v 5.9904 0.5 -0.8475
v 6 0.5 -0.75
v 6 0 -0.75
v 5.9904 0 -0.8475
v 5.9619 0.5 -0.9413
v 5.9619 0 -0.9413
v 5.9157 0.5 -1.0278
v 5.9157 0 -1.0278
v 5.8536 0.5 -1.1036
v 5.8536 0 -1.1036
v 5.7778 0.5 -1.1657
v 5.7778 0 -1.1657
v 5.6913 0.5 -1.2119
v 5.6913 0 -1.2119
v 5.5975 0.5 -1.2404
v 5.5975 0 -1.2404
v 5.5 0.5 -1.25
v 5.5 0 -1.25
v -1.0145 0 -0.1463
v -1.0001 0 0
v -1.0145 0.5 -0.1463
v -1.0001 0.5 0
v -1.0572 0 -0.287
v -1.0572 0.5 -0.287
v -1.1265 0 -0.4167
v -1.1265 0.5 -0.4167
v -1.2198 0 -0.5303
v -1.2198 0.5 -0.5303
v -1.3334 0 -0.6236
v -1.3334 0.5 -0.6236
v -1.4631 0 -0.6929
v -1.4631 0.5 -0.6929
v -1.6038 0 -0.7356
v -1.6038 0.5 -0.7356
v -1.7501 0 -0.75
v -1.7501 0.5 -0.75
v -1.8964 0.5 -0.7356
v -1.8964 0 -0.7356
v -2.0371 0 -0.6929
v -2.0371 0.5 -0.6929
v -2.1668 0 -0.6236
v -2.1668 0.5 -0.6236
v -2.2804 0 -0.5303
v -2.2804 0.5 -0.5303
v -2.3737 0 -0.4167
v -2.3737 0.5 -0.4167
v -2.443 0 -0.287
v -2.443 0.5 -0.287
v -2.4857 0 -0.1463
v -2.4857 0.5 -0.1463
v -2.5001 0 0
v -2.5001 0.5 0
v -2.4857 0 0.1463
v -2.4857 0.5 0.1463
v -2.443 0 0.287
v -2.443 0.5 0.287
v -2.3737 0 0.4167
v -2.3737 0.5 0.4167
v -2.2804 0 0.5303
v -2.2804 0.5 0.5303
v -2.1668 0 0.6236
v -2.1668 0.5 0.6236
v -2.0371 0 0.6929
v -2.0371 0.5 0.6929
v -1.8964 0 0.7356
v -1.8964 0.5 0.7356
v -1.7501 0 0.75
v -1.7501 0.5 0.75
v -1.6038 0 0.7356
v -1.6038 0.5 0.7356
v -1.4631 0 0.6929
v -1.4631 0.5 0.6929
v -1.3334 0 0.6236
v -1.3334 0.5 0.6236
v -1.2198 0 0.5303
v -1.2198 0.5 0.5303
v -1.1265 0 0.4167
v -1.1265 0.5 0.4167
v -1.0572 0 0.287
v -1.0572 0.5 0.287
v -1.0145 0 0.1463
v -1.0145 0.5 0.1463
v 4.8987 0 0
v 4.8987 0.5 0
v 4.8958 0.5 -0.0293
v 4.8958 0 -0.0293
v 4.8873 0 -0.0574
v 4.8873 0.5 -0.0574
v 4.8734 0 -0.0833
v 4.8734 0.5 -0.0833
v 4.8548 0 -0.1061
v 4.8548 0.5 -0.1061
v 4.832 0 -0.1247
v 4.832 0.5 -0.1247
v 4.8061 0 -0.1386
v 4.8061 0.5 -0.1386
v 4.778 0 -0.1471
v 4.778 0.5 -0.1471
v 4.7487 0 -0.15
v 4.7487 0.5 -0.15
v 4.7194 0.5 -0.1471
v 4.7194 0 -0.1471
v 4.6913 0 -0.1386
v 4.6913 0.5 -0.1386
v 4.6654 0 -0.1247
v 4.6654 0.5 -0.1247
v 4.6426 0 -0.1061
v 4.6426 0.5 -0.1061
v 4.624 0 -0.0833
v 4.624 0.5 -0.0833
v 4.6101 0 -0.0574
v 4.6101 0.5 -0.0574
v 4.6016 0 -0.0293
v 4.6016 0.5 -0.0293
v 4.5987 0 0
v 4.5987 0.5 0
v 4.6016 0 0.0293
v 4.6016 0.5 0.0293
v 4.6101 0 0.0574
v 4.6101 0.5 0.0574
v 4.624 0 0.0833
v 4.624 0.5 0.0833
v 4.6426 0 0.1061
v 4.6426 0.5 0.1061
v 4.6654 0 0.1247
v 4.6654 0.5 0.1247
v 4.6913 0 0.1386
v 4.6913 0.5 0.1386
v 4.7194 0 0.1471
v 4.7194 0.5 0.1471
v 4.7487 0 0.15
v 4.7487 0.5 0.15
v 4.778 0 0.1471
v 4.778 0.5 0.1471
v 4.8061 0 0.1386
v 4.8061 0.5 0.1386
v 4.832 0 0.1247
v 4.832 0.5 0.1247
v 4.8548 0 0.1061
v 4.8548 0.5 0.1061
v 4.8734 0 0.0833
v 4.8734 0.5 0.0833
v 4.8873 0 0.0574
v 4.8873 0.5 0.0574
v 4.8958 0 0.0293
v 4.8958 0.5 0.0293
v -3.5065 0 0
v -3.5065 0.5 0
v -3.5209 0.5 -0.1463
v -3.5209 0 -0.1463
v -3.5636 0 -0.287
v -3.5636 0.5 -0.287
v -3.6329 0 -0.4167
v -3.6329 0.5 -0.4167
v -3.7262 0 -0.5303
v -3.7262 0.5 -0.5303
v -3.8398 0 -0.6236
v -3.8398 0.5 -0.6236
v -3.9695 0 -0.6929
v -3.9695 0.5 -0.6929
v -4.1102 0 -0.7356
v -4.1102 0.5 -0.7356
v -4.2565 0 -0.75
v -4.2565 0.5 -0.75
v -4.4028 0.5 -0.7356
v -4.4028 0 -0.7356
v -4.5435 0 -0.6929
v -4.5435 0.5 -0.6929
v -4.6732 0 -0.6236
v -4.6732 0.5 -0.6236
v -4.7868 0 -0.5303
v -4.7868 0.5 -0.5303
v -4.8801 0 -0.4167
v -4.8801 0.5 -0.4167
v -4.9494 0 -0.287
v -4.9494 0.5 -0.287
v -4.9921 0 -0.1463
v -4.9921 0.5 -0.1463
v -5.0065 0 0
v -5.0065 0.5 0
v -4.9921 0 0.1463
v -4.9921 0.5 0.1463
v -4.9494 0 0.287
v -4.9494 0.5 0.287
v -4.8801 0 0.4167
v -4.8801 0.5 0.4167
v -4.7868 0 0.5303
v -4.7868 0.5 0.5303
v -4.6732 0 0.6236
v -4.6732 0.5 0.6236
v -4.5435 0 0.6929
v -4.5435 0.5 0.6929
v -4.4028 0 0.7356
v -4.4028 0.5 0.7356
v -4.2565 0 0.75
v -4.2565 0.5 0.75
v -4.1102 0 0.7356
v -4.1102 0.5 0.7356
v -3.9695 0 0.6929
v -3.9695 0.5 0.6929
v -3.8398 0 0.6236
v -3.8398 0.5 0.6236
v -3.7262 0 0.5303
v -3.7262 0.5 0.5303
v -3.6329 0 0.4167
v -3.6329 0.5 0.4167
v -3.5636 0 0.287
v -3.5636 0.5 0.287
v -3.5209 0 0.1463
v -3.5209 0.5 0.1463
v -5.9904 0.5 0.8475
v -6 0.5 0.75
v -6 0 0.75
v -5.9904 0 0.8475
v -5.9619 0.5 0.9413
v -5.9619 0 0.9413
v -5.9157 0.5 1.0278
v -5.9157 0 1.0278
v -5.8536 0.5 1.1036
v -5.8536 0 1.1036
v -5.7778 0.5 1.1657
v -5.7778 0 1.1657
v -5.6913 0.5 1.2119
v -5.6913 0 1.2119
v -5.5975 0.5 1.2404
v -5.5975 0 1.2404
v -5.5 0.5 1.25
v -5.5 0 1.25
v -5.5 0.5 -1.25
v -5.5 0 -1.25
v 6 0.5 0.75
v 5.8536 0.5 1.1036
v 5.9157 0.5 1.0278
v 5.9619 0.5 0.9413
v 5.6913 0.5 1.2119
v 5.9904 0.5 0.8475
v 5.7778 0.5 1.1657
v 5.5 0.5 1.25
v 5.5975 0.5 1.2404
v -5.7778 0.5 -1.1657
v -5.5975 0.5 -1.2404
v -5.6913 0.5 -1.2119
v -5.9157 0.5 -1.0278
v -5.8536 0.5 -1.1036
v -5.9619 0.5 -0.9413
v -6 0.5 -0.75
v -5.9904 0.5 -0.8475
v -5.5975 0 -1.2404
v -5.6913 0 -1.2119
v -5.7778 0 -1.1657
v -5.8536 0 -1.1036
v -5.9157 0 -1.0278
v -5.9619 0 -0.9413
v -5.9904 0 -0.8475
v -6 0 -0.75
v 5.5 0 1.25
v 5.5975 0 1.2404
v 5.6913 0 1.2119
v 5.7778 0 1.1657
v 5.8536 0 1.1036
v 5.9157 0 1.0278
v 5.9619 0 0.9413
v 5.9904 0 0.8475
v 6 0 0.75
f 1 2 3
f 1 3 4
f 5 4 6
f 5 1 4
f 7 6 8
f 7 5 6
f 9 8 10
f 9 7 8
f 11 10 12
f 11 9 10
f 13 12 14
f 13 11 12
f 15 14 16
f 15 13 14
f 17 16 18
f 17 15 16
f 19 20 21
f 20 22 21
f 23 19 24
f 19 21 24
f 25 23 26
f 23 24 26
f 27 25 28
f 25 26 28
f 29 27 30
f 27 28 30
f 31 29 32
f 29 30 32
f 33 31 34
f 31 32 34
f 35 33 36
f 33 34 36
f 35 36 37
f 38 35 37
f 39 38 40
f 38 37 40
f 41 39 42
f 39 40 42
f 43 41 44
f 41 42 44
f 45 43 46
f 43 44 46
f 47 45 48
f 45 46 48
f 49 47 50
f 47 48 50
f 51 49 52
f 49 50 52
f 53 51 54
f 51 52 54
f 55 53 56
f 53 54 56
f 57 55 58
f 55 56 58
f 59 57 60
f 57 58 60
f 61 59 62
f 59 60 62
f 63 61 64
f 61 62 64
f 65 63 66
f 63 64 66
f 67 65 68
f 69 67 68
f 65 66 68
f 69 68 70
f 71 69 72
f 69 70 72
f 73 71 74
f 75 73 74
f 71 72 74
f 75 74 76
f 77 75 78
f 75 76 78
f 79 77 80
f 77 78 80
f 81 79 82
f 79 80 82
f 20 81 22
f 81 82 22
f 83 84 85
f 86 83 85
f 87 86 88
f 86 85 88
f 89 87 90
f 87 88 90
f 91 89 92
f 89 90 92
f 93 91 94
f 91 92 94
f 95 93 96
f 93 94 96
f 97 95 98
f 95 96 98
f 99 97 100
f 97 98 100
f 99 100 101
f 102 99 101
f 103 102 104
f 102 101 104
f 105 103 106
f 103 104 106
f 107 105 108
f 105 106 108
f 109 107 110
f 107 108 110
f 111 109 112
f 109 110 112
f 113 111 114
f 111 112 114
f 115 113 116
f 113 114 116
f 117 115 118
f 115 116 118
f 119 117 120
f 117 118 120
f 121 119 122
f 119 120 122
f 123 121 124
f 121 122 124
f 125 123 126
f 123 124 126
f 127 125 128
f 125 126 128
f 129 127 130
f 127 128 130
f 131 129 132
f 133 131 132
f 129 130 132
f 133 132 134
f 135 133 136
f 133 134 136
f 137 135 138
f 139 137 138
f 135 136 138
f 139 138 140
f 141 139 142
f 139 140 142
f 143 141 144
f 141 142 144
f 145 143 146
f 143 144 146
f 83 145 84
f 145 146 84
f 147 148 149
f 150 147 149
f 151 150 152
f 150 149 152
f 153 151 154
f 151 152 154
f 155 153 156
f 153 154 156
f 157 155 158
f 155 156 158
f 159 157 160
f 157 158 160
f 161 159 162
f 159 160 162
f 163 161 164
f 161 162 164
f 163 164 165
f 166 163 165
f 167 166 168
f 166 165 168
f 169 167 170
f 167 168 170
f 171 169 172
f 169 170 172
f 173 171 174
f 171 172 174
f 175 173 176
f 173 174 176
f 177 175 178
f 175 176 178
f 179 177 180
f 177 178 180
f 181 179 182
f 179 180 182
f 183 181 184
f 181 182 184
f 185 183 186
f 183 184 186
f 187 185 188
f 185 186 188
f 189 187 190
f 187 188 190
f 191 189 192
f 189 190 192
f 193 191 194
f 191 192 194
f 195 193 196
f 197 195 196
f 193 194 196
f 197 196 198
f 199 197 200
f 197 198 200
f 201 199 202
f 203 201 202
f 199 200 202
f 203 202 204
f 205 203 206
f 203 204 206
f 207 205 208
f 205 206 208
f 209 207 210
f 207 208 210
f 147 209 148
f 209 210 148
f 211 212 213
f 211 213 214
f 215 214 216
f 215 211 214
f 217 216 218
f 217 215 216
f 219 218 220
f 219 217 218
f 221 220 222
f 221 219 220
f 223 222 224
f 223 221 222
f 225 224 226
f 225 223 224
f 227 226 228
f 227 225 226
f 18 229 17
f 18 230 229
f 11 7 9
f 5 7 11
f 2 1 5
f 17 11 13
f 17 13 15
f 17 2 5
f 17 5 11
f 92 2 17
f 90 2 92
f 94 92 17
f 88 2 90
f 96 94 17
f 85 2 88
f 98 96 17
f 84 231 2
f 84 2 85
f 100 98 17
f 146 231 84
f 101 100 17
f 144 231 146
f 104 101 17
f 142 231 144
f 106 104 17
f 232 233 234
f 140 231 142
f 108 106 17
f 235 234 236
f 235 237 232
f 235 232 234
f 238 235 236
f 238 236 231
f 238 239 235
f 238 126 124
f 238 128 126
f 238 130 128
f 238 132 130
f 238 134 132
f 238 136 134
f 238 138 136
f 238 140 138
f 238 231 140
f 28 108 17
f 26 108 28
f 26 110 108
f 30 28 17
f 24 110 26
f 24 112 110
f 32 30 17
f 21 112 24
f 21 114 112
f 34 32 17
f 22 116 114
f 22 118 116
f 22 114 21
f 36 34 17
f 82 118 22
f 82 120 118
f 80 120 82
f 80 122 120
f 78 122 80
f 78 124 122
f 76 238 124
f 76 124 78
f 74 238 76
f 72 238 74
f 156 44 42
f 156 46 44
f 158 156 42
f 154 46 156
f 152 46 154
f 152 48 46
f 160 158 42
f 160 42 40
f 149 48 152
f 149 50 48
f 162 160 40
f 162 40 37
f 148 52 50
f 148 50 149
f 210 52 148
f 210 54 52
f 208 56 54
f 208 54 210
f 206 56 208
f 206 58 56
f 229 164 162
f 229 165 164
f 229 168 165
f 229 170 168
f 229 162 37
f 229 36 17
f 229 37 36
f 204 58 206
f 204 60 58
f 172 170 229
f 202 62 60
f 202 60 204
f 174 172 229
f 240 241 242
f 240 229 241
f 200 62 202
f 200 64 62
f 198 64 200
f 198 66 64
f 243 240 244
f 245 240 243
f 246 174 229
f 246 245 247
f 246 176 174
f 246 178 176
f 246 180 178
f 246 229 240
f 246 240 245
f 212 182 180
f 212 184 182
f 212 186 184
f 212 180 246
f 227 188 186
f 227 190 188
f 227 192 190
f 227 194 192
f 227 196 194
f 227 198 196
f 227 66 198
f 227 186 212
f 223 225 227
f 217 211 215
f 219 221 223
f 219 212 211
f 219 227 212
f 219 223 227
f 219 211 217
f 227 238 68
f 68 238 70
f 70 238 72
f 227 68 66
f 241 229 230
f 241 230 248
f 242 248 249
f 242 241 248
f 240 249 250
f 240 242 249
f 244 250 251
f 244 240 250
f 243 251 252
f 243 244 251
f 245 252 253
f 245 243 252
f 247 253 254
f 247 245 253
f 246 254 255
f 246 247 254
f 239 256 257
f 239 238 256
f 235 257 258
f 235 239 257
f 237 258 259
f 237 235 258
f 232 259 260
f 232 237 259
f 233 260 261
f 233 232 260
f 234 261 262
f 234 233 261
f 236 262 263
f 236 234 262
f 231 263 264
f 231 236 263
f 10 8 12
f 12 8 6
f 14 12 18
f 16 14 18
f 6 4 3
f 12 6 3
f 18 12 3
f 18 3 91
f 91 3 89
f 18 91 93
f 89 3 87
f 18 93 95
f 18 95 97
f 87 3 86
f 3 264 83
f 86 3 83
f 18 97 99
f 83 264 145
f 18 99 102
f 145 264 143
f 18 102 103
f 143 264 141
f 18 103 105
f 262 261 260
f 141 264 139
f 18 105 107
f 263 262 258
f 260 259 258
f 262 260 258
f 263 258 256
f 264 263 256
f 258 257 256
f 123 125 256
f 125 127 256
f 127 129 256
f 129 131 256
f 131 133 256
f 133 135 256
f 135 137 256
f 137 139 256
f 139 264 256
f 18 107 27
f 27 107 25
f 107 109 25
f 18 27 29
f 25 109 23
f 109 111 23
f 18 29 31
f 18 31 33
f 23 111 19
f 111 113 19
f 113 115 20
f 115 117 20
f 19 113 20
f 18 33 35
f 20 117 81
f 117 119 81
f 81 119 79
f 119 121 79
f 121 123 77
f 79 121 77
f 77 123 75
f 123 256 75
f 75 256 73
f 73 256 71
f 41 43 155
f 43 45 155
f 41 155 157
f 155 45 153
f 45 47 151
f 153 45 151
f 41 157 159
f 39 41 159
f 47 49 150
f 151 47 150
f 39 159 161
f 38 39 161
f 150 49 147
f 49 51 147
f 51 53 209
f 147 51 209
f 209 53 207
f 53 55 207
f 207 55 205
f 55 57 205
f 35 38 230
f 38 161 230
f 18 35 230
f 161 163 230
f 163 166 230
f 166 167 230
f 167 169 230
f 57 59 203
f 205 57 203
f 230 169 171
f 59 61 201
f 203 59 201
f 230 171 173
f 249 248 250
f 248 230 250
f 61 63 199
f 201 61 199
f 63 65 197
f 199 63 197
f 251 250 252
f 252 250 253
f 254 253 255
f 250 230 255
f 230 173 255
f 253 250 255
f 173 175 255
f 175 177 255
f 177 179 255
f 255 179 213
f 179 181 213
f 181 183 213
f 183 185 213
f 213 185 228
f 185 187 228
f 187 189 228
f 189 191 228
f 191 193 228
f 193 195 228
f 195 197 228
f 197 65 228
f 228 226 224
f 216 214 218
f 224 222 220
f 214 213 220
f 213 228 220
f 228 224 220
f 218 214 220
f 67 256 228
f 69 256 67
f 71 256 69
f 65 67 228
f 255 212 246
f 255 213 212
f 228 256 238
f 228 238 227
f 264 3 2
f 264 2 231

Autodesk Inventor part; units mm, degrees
ref_plane "YZ Plane" through (0, 0, 0) normal (1, 0, 0) x (0, 1, 0)
ref_plane "XZ Plane" through (0, 0, 0) normal (0, 1, 0) x (-1, 0, 0)
ref_plane "XY Plane" through (0, 0, 0) normal (0, 0, 1) x (1, 0, 0)
sketch "Sketch1" plane through (0, 0, 0) normal (0, 1, 0) x (-1, 0, 0)
  line L0 (6, -1.25) -> (-6, -1.25)
  line L1 (-6, -1.25) -> (-6, 1.25)
  line L2 (-6, 1.25) -> (6, 1.25)
  line L3 (6, 1.25) -> (6, -1.25)
  line L4 (6, -1.25) -> (-6, 1.25) construction
  line L5 (-6, -1.25) -> (6, 1.25) construction
  point P0 (0, 0)
  dimension "d0" = 12
  dimension "d1" = 2.5
extrude "Extrusion1" add sketch "Sketch1" along normal blind 0.5
sketch "Sketch2" plane through (0, 0.5, 0) normal (0, 1, 0) x (1, 0, 0)
  circle A0 centre (-4.2565, 0) radius 0.75
  point P0 (0, 0)
  dimension "d4" = 1.5
extrude "Extrusion2" cut sketch "Sketch2" against normal blind 0.5
sketch "Sketch3" plane through (0, 0.5, 0) normal (0, 1, 0) x (1, 0, 0)
  circle A0 centre (-1.7501, 0) radius 0.75
  circle A1 centre (4.2419, 0) radius 0.75
  circle A2 centre (1.7477, 0) radius 0.75
  point P0 (0, 0)
  dimension "d7" = 1.5
  dimension "d8" = 1.5
  dimension "d9" = 1.5
extrude "Extrusion3" cut sketch "Sketch3" against normal blind 0.5 contours A0
sketch "Sketch7" plane through (0, 0.5, 0) normal (0, 1, 0) x (1, 0, 0)
  circle A0 centre (4.7487, 0) radius 0.15
  point P0 (0, 0)
  dimension "d21" = 0.3
extrude "Extrusion7" cut sketch "Sketch7" against normal blind 2
fillet "Fillet2" radius 0.5 1 edges at (6, 0.25, 1.25)
fillet "Fillet3" radius 0.5 1 edges at (6, 0.25, -1.25)
fillet "Fillet4" radius 0.5 1 edges at (-6, 0.25, 1.25)
fillet "Fillet5" radius 0.5 1 edges at (-6, 0.25, -1.25)
properties part number "stationary arm"
